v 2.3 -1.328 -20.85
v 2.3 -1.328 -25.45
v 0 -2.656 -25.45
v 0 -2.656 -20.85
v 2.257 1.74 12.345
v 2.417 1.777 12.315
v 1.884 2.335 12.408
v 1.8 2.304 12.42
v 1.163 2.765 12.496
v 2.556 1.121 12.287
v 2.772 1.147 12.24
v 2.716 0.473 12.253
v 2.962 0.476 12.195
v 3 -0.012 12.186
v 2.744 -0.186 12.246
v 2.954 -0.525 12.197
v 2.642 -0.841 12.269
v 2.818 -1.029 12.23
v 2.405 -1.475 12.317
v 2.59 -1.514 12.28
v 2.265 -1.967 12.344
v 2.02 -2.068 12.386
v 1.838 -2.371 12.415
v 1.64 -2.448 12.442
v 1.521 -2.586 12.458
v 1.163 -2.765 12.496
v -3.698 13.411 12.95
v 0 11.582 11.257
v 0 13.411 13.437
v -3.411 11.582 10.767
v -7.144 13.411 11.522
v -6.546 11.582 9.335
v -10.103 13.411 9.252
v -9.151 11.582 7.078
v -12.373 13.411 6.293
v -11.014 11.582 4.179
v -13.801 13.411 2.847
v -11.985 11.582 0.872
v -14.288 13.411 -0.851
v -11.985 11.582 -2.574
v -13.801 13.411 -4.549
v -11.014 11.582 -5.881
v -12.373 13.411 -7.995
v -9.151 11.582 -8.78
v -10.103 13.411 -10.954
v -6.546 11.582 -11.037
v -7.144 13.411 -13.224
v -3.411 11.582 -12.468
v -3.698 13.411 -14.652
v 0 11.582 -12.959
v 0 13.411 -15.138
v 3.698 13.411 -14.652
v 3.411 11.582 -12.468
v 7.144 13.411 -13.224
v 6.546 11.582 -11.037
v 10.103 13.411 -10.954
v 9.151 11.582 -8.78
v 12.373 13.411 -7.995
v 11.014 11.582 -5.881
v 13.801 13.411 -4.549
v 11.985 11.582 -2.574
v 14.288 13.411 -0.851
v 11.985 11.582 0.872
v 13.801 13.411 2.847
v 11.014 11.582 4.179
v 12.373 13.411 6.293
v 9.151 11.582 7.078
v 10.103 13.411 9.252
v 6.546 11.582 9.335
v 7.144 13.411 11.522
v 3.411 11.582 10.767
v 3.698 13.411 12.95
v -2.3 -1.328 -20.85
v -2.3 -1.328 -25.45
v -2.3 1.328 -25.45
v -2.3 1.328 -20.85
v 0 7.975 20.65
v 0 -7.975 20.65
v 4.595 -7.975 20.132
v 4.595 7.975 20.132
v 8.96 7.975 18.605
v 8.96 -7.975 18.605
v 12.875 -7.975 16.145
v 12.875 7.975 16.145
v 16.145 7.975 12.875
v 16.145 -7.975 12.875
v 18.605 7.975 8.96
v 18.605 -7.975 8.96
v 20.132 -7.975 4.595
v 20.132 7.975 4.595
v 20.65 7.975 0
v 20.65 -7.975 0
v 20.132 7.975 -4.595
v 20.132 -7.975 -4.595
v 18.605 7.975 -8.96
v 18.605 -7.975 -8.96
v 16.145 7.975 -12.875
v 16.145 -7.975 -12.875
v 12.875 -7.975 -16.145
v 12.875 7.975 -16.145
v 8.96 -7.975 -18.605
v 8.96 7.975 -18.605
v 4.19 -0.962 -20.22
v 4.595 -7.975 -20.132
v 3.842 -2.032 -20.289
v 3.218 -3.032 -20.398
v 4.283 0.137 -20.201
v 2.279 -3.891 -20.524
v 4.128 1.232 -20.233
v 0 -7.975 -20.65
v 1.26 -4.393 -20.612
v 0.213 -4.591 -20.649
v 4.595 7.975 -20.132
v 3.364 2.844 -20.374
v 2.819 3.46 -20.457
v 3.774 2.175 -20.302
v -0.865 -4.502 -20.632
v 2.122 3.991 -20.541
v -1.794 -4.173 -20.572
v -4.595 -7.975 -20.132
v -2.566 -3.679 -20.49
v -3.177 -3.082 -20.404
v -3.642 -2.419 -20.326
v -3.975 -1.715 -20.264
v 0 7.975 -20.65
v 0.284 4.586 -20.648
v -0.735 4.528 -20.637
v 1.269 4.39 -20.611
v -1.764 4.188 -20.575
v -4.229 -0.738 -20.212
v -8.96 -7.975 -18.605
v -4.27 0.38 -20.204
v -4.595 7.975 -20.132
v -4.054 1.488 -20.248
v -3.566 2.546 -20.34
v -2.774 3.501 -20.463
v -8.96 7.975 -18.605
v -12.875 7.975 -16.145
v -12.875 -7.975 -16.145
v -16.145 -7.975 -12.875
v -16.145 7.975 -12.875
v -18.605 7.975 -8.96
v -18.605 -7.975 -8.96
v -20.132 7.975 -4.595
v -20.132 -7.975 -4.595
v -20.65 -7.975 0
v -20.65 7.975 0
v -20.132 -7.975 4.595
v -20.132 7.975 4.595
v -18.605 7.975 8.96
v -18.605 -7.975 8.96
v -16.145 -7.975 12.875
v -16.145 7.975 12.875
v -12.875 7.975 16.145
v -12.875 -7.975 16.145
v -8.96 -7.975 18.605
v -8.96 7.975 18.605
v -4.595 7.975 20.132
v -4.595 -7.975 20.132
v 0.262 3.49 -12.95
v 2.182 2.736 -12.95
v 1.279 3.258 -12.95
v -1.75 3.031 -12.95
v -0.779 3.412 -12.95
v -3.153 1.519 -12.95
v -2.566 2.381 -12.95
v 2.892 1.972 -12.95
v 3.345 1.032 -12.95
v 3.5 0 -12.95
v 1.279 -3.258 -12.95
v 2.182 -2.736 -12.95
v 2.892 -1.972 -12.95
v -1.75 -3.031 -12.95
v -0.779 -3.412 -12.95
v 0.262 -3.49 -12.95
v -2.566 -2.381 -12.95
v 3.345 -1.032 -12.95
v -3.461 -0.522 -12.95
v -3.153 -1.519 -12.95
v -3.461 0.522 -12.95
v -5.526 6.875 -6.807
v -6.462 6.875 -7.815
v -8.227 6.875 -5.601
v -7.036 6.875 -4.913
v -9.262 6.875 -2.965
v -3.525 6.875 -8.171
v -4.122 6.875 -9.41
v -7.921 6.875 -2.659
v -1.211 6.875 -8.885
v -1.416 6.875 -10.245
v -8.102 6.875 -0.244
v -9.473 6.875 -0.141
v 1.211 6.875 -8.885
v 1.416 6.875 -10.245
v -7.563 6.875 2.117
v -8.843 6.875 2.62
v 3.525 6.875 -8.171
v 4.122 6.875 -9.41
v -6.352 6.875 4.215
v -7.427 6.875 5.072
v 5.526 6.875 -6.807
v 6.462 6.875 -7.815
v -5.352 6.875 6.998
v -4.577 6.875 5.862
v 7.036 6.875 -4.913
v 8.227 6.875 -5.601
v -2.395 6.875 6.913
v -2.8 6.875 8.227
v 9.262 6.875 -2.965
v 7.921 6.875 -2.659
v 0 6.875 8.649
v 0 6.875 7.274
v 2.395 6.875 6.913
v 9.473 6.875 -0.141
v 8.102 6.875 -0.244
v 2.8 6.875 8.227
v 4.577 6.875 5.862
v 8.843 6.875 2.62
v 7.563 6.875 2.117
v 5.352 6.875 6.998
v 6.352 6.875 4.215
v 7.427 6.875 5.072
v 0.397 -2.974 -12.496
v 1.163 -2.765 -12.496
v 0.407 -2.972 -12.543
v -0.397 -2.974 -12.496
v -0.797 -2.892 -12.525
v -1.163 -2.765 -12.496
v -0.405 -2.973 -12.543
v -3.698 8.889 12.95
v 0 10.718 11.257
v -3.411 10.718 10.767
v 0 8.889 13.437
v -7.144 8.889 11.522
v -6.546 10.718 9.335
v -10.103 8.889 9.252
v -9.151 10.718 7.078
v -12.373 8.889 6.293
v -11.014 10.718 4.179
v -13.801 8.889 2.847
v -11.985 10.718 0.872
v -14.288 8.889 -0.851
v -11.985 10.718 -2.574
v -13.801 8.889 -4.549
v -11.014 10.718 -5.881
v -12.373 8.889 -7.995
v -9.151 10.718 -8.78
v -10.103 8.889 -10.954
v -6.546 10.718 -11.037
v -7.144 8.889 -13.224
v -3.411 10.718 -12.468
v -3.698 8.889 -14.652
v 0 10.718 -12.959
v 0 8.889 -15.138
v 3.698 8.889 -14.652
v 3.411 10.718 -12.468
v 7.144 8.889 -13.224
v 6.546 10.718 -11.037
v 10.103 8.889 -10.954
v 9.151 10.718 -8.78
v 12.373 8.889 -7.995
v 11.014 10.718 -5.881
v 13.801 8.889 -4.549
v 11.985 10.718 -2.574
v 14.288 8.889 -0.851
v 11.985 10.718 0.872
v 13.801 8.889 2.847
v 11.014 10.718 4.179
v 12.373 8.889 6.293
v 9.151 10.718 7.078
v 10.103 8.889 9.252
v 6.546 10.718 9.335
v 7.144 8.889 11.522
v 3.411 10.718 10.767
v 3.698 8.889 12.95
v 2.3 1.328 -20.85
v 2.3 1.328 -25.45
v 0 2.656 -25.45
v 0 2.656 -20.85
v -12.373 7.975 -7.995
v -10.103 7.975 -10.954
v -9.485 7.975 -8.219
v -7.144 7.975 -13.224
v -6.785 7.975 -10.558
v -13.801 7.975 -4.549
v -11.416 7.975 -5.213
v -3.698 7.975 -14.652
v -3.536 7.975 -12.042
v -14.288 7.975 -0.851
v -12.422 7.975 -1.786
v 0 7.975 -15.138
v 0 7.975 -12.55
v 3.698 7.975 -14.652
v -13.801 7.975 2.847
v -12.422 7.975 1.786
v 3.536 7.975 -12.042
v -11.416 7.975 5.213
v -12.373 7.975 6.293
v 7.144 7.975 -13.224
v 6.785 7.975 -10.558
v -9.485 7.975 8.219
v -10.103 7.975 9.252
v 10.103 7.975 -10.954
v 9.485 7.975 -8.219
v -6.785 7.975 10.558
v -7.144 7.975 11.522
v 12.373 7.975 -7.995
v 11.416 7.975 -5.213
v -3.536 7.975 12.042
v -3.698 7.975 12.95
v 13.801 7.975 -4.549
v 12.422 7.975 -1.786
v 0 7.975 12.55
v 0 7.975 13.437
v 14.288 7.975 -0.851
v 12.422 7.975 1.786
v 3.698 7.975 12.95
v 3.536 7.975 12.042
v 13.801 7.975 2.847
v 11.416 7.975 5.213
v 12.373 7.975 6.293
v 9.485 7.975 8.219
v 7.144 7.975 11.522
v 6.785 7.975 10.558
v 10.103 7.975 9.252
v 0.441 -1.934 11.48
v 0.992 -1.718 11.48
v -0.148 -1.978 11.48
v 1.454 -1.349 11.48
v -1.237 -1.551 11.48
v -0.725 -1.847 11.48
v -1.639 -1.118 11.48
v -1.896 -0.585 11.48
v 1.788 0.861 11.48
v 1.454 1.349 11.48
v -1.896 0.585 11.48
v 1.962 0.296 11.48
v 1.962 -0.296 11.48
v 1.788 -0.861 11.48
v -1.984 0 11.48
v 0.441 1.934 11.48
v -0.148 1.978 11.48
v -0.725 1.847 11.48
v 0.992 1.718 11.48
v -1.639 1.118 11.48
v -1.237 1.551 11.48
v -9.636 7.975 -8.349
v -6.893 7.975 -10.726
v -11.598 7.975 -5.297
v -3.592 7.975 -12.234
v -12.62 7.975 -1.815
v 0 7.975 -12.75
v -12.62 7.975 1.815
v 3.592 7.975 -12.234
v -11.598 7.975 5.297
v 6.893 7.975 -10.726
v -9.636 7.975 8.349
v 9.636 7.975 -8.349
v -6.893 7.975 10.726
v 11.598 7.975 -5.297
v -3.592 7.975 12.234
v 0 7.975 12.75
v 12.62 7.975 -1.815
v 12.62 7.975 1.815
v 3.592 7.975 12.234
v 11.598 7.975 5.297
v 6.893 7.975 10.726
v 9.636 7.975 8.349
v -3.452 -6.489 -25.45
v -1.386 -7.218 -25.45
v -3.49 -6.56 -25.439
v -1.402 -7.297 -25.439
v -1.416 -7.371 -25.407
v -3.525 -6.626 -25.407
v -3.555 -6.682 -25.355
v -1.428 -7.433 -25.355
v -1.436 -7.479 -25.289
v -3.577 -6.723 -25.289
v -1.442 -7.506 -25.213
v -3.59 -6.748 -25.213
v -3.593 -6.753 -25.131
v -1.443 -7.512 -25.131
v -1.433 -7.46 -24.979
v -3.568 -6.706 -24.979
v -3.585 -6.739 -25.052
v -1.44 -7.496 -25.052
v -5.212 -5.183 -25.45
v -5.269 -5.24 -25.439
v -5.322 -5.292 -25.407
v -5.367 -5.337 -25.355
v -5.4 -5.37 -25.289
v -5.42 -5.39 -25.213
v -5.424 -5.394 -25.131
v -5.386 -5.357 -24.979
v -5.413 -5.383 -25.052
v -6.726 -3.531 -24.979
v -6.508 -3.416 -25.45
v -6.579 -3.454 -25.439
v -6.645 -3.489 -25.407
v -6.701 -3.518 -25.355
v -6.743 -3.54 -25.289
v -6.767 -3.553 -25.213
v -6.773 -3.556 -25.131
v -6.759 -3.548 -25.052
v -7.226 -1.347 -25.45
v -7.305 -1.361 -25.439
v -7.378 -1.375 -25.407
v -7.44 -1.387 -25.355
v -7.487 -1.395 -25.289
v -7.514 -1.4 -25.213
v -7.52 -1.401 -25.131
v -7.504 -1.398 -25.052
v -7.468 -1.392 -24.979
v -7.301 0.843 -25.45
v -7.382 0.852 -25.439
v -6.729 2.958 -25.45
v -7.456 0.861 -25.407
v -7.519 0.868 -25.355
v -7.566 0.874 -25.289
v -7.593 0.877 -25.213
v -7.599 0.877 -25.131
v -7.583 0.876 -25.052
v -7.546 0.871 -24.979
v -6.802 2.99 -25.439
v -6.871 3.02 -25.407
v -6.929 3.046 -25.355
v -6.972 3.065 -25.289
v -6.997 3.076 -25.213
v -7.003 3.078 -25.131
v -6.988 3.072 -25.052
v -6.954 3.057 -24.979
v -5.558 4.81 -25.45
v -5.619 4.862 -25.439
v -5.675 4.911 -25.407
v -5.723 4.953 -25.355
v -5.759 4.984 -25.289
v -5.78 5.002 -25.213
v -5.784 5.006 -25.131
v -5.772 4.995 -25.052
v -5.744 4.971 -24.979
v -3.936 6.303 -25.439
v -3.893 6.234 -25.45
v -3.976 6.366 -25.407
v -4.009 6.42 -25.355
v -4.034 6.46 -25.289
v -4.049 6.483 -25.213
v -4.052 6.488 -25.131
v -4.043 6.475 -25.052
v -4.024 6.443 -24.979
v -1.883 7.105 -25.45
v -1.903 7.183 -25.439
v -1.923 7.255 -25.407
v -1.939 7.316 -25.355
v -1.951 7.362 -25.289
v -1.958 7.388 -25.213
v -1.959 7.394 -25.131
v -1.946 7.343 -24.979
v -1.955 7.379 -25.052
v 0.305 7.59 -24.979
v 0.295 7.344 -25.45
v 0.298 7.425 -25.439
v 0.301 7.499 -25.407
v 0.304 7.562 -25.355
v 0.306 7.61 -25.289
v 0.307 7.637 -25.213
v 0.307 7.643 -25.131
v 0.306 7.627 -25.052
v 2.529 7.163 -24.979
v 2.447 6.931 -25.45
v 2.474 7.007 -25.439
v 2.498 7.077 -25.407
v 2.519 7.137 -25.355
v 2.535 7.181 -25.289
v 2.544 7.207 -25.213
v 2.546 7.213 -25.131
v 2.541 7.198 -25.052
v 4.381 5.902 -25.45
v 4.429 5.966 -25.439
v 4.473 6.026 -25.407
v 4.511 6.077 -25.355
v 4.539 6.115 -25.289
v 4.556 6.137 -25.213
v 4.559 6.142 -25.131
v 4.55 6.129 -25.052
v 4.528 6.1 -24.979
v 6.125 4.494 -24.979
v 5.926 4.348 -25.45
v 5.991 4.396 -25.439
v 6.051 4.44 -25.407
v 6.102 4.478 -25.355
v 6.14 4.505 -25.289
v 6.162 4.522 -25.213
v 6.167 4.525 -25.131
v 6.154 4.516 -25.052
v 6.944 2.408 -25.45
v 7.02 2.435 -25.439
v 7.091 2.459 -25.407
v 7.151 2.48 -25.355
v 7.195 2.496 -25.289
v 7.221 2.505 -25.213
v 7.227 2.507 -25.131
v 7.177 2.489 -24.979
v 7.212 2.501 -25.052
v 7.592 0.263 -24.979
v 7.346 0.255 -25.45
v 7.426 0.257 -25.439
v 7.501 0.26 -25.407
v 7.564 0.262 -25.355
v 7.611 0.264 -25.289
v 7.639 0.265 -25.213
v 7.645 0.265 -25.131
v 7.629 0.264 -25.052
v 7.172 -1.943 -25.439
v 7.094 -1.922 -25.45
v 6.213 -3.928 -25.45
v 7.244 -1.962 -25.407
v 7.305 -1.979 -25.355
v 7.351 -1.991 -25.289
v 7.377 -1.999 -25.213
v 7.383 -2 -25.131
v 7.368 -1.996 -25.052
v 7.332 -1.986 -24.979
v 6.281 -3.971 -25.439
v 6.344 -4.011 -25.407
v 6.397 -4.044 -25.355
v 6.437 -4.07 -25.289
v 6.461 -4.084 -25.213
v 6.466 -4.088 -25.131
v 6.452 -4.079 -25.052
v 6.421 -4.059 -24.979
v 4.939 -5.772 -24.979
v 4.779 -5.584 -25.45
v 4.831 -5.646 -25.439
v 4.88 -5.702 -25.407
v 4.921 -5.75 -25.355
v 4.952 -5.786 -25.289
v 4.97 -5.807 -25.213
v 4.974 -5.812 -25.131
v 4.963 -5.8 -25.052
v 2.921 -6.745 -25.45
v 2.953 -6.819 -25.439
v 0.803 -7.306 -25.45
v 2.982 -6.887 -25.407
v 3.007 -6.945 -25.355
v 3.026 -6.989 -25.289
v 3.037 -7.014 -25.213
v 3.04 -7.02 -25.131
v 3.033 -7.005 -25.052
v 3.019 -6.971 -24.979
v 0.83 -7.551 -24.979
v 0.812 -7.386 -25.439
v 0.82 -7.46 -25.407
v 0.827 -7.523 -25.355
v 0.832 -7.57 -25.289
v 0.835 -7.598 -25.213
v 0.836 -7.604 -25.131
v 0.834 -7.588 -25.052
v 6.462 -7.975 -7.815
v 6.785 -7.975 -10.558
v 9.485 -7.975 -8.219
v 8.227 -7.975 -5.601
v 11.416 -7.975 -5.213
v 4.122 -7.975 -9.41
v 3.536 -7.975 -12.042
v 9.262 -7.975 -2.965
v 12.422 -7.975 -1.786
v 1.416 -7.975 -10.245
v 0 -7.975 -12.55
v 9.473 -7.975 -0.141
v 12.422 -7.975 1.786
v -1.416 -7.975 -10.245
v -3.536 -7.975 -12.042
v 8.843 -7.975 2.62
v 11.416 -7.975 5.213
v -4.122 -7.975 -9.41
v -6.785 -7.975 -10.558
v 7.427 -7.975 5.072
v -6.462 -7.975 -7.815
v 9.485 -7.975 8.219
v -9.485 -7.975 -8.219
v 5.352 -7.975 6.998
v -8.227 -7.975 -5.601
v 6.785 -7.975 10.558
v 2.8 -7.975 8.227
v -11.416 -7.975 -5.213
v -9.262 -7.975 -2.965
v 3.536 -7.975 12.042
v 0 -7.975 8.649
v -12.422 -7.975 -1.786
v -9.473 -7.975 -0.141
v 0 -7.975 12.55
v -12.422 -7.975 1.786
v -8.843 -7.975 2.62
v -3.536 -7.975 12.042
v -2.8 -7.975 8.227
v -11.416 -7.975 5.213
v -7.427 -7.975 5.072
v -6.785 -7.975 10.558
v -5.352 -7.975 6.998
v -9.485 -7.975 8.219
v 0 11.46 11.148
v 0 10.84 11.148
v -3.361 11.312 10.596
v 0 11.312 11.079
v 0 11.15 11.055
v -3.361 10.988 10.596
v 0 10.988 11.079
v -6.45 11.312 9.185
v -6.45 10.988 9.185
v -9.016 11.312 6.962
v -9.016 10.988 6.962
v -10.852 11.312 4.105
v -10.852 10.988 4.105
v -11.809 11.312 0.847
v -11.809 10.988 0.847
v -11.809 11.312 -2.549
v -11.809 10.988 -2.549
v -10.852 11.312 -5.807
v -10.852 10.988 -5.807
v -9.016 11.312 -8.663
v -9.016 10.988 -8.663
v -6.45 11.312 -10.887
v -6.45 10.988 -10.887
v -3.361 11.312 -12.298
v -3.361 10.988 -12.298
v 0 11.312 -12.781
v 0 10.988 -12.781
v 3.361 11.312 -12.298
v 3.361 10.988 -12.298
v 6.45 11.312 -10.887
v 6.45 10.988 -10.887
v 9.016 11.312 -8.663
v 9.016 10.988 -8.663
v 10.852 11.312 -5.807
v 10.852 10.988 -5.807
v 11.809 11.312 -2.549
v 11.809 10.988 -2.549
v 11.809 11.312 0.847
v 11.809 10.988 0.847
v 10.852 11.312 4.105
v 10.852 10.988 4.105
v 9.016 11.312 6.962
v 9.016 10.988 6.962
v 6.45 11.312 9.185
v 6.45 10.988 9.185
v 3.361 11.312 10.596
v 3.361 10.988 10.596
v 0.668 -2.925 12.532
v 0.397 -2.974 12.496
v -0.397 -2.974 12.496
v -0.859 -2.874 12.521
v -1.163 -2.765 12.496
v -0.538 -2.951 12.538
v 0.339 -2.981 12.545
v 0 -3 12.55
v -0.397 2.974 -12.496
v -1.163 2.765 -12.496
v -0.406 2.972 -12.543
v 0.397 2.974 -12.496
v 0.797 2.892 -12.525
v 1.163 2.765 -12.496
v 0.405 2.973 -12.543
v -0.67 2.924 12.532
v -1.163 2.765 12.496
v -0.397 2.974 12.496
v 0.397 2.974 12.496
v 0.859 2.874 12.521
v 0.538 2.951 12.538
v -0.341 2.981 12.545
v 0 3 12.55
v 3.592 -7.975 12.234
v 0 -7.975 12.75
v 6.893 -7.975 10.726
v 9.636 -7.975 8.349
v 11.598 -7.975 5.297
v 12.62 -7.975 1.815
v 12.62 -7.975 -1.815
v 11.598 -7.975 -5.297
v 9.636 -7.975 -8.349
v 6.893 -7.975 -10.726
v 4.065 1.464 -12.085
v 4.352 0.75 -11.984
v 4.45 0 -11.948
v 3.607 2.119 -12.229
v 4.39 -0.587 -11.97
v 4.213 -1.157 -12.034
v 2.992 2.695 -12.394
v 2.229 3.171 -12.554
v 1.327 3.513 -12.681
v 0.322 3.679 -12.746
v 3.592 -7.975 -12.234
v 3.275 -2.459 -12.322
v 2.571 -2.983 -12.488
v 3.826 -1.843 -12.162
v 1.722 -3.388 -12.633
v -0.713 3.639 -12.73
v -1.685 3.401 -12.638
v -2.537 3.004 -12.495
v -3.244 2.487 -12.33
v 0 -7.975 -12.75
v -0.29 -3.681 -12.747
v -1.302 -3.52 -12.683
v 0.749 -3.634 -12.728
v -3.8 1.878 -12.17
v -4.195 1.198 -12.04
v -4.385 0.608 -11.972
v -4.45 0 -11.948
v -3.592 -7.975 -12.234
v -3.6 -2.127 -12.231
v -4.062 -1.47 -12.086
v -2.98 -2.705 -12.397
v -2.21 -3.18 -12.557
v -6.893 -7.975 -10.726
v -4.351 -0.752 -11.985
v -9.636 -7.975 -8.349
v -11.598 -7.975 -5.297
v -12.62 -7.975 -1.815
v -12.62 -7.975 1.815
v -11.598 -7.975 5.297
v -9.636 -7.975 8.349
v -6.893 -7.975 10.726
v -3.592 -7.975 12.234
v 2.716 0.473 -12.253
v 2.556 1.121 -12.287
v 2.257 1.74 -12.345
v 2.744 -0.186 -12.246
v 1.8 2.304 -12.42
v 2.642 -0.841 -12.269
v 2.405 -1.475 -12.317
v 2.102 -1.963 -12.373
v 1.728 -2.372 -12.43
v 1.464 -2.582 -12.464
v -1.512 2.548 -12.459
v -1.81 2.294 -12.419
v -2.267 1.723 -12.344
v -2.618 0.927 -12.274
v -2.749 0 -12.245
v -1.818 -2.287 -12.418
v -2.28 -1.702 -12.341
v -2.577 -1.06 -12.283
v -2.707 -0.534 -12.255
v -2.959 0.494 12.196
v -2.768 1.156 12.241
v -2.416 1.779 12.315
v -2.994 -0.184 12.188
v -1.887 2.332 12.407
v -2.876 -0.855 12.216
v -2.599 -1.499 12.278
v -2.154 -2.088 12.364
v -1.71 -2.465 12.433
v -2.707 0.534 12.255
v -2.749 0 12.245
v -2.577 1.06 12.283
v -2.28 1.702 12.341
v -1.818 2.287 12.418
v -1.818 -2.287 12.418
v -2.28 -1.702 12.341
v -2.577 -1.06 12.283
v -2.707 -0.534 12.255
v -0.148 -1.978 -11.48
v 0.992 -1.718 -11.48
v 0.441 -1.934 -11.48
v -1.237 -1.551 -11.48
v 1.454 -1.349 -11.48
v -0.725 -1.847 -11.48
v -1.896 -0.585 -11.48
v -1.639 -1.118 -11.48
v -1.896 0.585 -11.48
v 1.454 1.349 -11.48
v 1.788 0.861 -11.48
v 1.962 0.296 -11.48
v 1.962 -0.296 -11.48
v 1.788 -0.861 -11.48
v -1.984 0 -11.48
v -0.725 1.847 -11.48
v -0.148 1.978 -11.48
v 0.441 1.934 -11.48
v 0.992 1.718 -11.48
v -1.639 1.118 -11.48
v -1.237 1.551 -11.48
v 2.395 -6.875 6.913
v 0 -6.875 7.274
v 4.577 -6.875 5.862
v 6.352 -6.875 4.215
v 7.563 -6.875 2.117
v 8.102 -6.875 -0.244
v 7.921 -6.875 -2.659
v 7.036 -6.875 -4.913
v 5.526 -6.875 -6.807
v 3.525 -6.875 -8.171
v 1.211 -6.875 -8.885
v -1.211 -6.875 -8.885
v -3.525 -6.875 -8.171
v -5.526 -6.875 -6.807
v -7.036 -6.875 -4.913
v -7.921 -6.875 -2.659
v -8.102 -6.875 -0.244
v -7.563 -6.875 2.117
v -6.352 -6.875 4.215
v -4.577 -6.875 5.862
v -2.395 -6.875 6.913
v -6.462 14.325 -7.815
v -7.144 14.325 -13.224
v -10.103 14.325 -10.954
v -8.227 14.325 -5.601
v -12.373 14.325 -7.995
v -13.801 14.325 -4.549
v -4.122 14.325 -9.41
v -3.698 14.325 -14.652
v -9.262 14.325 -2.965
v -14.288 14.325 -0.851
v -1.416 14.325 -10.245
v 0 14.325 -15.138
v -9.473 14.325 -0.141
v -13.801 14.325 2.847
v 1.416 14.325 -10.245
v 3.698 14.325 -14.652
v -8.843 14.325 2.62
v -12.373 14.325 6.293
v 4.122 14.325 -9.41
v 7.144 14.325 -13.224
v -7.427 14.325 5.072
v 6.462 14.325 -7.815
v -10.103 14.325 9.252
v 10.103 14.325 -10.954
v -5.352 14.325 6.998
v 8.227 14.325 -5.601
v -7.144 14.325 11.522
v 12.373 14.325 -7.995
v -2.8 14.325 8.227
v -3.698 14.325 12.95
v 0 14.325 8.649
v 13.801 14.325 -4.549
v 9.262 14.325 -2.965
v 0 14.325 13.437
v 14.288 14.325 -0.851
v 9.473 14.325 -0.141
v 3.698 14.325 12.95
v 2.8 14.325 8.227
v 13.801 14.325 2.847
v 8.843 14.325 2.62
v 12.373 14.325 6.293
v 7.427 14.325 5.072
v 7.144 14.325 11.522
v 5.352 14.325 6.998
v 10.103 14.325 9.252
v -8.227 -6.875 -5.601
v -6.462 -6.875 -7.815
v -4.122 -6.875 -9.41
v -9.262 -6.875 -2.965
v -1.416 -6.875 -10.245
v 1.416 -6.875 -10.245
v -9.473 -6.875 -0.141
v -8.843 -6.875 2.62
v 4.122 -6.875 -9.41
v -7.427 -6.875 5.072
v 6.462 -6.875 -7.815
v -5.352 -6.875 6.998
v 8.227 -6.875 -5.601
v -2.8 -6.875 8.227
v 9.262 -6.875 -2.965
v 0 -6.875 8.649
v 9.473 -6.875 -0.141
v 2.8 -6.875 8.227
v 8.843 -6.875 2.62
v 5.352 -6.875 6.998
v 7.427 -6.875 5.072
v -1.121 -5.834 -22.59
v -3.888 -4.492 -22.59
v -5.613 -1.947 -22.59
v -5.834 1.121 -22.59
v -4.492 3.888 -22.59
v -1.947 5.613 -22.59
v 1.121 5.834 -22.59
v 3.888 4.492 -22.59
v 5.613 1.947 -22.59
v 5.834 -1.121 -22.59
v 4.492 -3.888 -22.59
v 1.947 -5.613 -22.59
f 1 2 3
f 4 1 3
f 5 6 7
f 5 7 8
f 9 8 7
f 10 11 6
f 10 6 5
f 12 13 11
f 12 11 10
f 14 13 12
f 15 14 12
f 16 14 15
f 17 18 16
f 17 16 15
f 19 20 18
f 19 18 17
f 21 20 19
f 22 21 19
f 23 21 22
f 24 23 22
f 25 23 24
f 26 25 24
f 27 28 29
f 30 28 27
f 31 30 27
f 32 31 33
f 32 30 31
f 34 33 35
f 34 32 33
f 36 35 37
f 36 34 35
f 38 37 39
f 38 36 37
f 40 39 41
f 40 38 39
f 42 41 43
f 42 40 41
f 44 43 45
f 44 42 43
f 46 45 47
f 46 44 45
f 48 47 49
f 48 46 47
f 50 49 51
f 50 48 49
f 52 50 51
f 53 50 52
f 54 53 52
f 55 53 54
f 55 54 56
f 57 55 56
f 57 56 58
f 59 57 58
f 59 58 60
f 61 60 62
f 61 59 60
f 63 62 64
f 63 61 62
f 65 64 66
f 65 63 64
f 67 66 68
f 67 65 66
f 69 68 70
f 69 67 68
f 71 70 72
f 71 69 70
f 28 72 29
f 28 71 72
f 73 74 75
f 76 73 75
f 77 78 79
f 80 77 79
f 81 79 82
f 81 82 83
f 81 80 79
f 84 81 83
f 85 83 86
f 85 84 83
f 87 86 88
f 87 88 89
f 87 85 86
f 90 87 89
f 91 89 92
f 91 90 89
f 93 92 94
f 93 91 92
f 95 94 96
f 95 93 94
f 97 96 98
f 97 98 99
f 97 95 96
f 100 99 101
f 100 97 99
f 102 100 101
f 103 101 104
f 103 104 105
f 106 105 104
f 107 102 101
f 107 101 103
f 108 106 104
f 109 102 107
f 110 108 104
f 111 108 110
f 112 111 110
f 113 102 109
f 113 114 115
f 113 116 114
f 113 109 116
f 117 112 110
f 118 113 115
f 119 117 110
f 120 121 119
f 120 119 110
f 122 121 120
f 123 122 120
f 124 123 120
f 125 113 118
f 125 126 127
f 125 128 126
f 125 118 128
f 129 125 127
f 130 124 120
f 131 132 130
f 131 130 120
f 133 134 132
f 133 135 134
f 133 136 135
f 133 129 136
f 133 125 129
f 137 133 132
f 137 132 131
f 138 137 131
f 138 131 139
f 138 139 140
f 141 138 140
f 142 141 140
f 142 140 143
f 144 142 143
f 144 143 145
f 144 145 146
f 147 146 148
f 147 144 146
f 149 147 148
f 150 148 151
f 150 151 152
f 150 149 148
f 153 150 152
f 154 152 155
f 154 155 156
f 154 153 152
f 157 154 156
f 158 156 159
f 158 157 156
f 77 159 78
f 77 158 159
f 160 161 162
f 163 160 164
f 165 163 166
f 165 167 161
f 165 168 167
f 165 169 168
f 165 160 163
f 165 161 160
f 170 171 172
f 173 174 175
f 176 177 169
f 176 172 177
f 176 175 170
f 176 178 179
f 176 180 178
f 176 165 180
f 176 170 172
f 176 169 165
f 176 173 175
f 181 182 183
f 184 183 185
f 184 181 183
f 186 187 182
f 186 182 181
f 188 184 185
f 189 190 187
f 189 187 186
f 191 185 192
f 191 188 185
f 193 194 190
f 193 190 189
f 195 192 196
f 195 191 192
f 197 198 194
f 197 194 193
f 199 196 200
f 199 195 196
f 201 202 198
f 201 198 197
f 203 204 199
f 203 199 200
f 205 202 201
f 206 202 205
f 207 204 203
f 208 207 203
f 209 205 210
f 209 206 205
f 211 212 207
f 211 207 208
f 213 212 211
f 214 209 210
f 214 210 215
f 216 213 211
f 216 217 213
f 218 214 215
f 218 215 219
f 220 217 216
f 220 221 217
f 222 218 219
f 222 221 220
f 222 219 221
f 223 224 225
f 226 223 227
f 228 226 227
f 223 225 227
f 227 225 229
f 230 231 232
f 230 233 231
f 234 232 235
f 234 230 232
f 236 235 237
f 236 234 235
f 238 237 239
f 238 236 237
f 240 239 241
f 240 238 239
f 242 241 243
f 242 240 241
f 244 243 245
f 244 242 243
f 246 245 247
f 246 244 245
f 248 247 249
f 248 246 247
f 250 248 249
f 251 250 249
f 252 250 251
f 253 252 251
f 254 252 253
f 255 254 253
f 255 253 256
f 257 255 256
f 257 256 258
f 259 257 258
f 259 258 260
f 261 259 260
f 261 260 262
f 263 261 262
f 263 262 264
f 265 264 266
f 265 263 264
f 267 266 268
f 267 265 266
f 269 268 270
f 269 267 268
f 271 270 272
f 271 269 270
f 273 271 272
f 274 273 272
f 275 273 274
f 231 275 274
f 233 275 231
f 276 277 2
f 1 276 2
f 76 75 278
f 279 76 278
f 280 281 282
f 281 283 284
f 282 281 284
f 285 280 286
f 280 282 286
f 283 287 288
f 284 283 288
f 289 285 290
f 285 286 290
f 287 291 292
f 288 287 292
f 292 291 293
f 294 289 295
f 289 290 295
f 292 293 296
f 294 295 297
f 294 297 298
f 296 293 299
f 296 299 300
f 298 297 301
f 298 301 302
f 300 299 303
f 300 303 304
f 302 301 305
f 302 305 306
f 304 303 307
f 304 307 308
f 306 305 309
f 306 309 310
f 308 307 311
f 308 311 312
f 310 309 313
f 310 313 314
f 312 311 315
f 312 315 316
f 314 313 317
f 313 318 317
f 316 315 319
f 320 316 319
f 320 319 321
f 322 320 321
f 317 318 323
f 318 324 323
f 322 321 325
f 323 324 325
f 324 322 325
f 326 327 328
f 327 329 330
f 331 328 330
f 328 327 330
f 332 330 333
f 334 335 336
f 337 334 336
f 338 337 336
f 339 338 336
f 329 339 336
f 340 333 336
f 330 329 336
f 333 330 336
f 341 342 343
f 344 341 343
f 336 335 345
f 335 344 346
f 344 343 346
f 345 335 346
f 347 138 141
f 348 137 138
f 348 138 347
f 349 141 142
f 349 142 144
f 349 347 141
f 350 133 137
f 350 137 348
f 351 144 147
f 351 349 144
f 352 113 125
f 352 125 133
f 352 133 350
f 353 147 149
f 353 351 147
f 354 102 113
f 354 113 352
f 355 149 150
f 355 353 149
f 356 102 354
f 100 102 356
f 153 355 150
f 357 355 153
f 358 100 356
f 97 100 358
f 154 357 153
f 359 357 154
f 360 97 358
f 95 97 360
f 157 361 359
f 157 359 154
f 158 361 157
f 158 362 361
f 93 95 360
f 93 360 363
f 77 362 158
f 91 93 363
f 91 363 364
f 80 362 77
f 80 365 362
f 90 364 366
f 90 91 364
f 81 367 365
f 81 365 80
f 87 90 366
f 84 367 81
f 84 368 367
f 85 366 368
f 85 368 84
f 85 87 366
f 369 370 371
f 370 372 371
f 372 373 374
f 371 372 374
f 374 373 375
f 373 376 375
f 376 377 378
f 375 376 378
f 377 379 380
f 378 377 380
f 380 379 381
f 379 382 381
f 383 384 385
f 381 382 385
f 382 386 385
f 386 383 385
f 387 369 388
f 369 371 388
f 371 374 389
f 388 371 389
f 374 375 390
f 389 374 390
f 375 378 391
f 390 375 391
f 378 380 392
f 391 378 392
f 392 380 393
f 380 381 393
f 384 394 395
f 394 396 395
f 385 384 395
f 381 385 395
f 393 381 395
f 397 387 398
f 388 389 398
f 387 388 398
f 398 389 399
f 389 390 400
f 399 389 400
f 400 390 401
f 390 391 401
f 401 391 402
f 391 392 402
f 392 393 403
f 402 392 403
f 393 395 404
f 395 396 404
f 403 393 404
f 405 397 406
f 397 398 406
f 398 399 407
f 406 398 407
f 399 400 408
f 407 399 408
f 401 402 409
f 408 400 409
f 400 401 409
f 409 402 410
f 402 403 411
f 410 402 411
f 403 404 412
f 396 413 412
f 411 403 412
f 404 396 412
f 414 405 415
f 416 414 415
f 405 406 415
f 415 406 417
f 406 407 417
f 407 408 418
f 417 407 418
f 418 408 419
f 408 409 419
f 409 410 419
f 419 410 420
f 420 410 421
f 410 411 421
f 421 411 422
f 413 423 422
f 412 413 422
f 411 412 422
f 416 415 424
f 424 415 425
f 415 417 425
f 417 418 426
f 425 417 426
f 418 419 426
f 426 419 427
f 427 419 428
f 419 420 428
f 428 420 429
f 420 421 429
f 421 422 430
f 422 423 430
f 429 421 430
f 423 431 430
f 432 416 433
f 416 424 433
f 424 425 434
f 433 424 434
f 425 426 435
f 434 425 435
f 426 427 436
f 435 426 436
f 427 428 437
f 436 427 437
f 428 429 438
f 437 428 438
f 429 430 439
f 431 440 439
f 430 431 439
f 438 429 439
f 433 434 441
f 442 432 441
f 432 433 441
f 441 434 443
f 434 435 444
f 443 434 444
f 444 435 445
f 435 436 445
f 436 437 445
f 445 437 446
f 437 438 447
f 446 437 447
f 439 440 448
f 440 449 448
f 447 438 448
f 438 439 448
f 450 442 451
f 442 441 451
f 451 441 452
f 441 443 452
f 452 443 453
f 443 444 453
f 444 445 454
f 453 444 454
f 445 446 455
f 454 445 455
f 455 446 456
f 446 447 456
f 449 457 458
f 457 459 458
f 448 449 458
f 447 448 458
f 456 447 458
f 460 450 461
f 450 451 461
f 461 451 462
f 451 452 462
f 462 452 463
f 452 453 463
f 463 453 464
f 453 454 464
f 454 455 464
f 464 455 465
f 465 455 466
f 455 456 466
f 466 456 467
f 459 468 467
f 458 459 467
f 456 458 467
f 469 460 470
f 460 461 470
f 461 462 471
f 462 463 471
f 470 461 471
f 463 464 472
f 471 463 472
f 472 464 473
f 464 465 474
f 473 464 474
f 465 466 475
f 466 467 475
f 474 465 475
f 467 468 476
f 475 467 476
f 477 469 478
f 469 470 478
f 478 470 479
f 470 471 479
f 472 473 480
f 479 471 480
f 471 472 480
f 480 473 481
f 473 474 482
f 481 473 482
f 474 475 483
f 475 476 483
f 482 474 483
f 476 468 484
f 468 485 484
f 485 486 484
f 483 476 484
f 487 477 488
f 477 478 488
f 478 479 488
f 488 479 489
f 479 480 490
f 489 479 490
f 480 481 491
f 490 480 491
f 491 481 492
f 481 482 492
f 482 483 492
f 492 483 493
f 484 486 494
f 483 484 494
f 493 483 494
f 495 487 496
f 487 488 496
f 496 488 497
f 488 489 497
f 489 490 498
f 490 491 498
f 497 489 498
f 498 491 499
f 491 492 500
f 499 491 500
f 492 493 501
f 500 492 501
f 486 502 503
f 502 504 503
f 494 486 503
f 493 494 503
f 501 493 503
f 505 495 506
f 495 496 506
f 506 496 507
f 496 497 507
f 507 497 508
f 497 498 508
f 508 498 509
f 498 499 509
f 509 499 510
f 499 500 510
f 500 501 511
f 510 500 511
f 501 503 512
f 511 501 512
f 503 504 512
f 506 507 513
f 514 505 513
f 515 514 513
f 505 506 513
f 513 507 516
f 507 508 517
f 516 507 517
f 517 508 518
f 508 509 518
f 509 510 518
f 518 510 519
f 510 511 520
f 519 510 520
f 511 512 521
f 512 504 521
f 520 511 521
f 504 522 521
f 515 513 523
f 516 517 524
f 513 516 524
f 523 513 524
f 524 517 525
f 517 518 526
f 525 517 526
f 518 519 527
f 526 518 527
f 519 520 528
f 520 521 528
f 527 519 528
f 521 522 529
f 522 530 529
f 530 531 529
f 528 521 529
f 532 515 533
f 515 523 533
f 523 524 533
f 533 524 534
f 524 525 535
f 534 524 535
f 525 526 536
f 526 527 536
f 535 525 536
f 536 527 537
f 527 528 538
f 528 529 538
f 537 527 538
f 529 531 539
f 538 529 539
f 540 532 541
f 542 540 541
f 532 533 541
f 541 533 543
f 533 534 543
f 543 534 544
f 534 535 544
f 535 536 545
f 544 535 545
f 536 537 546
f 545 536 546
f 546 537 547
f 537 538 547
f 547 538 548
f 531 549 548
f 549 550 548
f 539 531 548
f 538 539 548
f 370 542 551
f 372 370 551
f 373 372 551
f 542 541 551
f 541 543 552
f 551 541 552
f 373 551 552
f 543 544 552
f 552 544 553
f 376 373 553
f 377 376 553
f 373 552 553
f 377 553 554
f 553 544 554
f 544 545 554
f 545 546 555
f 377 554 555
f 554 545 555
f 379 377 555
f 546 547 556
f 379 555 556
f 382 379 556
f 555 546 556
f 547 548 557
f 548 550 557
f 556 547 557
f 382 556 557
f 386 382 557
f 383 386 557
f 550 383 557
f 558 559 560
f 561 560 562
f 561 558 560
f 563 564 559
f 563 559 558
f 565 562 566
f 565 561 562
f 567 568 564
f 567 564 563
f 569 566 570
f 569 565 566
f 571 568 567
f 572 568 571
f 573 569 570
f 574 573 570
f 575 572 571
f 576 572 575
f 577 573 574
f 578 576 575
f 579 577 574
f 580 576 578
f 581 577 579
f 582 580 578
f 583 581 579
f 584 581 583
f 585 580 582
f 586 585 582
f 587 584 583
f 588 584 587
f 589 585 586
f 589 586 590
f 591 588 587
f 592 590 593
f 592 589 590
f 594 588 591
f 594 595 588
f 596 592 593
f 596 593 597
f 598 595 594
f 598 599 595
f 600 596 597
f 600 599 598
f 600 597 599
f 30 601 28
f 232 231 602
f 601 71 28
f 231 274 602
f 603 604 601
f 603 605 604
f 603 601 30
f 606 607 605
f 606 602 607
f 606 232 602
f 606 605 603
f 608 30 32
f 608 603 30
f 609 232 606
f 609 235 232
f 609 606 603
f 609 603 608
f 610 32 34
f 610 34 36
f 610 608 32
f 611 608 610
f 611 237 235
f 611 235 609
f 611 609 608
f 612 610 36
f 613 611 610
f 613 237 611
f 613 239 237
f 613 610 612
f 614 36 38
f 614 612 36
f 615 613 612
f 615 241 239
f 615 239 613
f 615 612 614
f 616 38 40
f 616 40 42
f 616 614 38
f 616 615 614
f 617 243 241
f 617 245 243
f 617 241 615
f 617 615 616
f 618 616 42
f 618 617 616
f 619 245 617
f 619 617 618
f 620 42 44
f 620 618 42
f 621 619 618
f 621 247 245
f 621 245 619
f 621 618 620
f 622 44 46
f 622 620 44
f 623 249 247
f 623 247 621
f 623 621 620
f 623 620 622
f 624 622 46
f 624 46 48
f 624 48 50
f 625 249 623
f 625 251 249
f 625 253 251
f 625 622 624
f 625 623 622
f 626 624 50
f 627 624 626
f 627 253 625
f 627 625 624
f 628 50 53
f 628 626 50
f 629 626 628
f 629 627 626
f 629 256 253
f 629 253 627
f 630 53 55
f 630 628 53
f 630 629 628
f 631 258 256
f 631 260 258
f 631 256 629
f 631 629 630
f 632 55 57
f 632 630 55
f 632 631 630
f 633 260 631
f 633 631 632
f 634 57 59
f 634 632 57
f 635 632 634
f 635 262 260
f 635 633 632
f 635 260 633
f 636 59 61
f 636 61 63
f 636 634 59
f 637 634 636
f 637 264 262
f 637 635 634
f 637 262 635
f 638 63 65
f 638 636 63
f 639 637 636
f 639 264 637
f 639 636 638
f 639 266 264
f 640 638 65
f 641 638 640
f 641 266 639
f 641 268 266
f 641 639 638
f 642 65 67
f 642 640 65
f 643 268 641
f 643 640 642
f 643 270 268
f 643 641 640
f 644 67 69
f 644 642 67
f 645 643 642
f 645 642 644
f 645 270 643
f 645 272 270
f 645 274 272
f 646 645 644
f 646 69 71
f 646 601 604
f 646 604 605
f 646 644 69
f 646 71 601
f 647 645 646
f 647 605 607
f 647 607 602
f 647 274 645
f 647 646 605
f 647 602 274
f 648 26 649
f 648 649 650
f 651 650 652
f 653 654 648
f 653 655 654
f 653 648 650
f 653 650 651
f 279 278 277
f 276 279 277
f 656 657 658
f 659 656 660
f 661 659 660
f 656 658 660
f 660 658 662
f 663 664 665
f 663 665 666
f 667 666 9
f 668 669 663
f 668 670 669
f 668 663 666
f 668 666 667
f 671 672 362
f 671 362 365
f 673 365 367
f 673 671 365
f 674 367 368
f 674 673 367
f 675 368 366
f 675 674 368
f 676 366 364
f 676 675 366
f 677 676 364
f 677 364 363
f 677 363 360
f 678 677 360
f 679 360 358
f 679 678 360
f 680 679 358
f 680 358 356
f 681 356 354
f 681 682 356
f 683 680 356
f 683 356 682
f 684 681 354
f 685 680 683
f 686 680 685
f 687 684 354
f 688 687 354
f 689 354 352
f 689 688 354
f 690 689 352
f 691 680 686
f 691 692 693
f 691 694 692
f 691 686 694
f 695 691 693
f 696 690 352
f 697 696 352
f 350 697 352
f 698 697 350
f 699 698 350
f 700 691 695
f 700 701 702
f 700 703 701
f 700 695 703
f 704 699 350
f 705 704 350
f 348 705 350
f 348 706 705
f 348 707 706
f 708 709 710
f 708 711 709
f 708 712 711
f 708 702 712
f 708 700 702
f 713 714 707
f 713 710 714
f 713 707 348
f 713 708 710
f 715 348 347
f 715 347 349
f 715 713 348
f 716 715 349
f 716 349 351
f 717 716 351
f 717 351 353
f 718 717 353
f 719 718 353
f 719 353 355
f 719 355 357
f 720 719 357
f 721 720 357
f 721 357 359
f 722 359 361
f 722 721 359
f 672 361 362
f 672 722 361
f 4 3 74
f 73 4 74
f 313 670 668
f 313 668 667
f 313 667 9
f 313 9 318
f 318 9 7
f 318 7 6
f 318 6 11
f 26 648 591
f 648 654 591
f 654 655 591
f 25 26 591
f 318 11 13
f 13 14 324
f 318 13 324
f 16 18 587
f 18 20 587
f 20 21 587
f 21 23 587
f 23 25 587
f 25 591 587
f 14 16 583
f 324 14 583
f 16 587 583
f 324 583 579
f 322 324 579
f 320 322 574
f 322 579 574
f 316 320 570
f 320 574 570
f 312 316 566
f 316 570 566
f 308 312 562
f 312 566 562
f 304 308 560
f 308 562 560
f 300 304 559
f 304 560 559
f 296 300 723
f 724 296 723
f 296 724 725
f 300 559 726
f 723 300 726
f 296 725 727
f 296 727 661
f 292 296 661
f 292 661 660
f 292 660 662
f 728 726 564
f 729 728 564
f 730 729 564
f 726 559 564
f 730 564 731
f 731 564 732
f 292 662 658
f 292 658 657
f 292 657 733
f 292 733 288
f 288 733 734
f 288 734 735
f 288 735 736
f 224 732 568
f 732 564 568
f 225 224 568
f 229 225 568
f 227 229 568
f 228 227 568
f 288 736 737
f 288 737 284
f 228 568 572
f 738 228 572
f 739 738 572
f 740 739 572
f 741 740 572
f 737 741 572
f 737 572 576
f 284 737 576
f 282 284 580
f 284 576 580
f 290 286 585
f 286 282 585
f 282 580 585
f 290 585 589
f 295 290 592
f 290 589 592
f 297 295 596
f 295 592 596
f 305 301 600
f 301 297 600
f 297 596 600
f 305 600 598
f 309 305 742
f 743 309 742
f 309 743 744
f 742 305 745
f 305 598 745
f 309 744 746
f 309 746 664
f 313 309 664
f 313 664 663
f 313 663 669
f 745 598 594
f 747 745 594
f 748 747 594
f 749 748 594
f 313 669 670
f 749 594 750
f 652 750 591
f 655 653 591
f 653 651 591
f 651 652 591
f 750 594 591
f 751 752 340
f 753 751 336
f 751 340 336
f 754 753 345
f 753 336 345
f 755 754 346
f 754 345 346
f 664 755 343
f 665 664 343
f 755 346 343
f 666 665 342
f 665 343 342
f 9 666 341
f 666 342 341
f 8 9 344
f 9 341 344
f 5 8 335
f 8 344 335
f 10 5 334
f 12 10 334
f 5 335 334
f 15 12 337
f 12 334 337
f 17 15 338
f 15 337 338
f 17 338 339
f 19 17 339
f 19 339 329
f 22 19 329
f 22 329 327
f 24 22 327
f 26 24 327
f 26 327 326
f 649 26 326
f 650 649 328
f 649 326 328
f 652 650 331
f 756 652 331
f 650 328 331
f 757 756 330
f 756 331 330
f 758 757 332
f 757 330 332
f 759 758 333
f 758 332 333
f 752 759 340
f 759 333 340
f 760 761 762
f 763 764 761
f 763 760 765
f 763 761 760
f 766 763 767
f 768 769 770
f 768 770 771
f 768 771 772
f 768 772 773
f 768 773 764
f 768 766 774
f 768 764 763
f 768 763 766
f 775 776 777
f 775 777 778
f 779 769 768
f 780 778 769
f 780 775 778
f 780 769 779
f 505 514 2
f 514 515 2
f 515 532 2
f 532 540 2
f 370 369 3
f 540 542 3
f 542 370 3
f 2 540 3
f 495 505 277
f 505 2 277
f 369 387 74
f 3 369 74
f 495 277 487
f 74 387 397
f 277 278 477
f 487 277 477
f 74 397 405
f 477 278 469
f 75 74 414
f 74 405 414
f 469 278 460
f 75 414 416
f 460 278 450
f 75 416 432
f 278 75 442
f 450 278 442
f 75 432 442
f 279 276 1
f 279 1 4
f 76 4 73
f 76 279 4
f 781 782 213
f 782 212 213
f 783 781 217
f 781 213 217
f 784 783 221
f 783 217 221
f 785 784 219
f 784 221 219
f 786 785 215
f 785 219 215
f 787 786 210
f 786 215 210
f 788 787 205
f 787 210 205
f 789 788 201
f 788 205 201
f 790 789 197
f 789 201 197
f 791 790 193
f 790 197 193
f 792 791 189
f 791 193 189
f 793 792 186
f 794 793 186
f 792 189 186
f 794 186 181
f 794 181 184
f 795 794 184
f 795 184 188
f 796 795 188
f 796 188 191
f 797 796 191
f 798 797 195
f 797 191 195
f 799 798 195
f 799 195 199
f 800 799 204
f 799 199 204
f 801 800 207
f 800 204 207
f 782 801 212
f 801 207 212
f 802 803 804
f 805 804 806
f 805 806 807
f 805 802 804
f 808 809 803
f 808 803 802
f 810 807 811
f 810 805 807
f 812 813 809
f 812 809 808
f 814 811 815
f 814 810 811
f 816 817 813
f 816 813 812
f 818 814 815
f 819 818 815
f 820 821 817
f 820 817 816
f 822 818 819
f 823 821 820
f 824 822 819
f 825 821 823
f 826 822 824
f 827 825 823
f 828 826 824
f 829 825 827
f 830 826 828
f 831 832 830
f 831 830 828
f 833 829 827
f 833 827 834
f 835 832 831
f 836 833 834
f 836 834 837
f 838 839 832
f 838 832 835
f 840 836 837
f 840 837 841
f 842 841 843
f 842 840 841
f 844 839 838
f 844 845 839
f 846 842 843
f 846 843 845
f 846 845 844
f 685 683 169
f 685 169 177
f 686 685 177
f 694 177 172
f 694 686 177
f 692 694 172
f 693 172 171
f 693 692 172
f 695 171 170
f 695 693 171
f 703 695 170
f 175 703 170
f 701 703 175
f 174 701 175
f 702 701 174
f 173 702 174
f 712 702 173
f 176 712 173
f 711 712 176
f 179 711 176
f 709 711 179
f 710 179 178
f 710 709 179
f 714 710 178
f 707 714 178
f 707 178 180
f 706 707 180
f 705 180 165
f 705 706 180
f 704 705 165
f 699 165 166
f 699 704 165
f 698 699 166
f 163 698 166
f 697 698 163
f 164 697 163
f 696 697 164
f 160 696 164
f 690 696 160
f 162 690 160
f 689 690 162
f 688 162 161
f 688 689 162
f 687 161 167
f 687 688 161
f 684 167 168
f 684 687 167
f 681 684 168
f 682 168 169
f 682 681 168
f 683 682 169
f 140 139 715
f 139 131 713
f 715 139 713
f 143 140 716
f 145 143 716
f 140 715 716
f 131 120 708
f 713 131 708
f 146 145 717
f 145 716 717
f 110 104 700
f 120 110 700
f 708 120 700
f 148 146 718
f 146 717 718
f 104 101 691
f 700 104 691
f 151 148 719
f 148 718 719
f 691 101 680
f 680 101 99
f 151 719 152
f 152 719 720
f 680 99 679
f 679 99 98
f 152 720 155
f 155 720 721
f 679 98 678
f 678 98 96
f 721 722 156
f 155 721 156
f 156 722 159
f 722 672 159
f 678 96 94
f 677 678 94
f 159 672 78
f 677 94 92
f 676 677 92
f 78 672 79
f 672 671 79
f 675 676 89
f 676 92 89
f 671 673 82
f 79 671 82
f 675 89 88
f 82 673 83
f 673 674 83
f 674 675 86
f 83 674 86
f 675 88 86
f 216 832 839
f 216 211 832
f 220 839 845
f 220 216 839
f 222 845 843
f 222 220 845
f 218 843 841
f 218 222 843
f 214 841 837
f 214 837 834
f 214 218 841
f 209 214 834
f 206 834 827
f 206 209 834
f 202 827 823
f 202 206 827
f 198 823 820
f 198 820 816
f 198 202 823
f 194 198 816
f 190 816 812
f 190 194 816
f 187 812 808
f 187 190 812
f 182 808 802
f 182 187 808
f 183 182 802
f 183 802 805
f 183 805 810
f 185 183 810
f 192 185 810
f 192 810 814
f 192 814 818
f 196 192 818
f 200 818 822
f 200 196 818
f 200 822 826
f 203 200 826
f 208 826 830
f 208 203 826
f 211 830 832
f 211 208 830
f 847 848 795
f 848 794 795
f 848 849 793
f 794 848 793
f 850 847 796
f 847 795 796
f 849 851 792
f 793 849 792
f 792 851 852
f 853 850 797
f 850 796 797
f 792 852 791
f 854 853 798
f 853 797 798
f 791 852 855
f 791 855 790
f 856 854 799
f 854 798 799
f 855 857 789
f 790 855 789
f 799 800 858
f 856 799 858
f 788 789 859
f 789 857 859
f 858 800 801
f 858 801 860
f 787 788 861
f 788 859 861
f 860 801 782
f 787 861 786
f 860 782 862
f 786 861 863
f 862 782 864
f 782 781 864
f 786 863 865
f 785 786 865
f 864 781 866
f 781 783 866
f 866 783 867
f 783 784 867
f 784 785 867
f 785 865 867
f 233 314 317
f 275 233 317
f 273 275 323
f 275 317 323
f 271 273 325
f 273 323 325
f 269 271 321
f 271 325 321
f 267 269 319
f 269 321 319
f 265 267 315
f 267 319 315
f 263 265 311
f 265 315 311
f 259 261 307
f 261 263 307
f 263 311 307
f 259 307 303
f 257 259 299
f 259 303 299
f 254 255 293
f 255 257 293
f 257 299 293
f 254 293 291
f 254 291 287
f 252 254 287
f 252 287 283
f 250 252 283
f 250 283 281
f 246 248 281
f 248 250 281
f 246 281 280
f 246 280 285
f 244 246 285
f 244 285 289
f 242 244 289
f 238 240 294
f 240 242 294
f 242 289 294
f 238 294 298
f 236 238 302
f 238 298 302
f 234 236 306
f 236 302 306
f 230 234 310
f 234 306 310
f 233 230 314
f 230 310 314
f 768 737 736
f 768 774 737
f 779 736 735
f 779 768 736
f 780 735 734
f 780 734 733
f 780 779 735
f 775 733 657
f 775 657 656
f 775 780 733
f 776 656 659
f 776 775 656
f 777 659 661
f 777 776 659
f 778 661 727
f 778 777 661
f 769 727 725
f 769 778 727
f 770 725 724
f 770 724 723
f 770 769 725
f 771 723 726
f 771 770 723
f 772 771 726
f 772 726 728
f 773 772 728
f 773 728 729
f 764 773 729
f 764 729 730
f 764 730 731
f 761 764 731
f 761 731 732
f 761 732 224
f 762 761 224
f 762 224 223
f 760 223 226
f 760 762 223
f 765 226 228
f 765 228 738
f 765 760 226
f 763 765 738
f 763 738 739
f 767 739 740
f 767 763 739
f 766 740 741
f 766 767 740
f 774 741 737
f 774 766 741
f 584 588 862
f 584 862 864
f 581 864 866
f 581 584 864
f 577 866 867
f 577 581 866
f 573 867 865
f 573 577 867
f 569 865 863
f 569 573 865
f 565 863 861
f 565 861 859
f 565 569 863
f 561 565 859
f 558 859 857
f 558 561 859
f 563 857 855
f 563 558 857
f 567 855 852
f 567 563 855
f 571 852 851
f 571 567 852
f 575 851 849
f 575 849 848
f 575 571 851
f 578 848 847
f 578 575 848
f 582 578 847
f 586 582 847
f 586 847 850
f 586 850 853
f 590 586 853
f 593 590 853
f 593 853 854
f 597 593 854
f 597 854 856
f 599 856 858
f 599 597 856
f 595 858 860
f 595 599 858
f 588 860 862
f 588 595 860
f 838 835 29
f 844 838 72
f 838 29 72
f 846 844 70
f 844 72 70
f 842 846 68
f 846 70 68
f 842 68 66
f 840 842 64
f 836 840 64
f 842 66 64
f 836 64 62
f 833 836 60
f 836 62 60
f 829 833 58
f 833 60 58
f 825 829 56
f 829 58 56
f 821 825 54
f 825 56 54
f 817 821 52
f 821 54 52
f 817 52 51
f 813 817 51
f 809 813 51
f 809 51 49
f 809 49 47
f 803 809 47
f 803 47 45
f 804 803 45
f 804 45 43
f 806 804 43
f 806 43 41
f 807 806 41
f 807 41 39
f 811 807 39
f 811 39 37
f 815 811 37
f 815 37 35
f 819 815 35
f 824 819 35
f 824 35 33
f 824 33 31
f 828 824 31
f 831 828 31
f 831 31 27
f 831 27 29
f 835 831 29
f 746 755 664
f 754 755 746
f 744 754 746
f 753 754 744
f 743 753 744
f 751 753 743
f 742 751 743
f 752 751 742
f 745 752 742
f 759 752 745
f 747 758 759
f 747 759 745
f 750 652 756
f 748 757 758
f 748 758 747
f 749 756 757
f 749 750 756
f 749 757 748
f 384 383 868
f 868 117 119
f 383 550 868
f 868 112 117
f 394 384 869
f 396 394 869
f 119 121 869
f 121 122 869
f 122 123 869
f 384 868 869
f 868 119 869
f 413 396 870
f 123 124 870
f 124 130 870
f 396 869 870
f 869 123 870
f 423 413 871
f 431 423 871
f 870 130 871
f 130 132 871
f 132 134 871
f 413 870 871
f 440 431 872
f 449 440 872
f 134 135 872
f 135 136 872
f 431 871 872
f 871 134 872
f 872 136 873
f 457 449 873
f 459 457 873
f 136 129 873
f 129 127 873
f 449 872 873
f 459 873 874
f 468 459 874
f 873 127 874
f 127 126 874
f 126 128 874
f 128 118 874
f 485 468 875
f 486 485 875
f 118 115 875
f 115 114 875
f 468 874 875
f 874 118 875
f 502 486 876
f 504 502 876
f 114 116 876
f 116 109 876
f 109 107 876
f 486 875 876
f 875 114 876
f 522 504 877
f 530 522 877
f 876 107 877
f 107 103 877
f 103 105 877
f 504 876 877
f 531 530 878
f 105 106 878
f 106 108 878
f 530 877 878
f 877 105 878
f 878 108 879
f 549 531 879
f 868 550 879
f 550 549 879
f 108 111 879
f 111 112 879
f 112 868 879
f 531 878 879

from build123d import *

# Parameters (mm, degrees)
SKETCH1_R                       = 20.65
SKETCH1_R_2                     = 12.75
BOSS_EXTRUDE1_DEPTH             = 7.975
CUT_EXTRUDE1_DEPTH              = 4.6
BOSS_EXTRUDE2_REACH             = 35.73
SKETCH5_R                       = 12.55
SKETCH5_R_2                     = 8.125
BOSS_EXTRUDE2_DIRECTION_2_REACH = 35.73
SKETCH6_R                       = 9.5
CUT_EXTRUDE2_DEPTH              = 1.1
SKETCH7_R                       = 14.2875
SKETCH7_R_2                     = 9.5
BOSS_EXTRUDE4_DEPTH             = 6.35
SKETCH9_R                       = 3
CUT_EXTRUDE3_DEPTH              = 13.97
CHAMFER1_SIZE                   = 1.016
CHAMFER1_OF_MIRROR2_SIZE        = 1.016


with BuildPart() as part:
    # Sketch1 → Boss-Extrude1 (new, symmetric)
    with BuildSketch(Plane(origin=(0, 0, 0), x_dir=(1, 0, 0), z_dir=(0, 1, 0))):
        with Locations(Location((0, 0, 0), (0, 0, 270))):
            Circle(SKETCH1_R)
        with Locations(Location((0, 0, 0), (0, 0, 270))):
            Circle(SKETCH1_R_2, mode=Mode.SUBTRACT)
    extrude(amount=BOSS_EXTRUDE1_DEPTH, both=True)

    # Sketch2 → Revolve1 (revolve)
    with BuildSketch(Plane(origin=(0, 0, 0), x_dir=(1, 0, 0), z_dir=(0, 1, 0)), mode=Mode.PRIVATE) as revolve1_sk:
        with BuildLine():
            Line((0, 25.45), (-7.35, 25.45))
            ThreePointArc((-7.35, 25.45), (-7.615766407, 25.289169741), (-7.596577614, 24.979121446))
            Line((-7.596577614, 24.979121446), (-4.2850054, 20.200525457))
            Line((-4.2850054, 20.200525457), (0, 20.200525457))
            Line((0, 20.200525457), (0, 25.45))
        make_face()
    revolve(revolve1_sk.sketch.rotate(Axis((0, 0, 23), (0, 0, -1)), 280.872235791), axis=Axis((0, 0, 23), (0, 0, -1)))

    # Sketch3 → Cut-Extrude1 (cut)
    with BuildSketch(Plane(origin=(0, 0, -25.45), x_dir=(-1, 0, 0), z_dir=(0, 0, -1))):
        Polygon((0, 2.655811238), (-2.3, 1.327905619), (-2.3, -1.327905619), (0, -2.655811238), (2.3, -1.327905619), (2.3, 1.327905619), align=None)
    extrude(amount=-CUT_EXTRUDE1_DEPTH, mode=Mode.SUBTRACT)

    # Sketch4 → Cut-Revolve2 (revolve, cut)
    with BuildSketch(Plane(origin=(0, 0, 0), x_dir=(1, 0, 0), z_dir=(0, 1, 0)), mode=Mode.PRIVATE) as cut_revolve2_sk:
        Polygon((0, 12.95), (-3.5, 12.95), (-4.45, 11.948221625), (0, 11.948221625), align=None)
    revolve(cut_revolve2_sk.sketch.rotate(Axis((0, 0, 23), (0, 0, -1)), 180), axis=Axis((0, 0, 23), (0, 0, -1)), mode=Mode.SUBTRACT)


with BuildPart() as body_2:

    # Boss-Extrude2: up to this face of the body (flat: up to its plane)
    boss_extrude2_end = Plane(part.part.faces().sort_by_distance((0, 7.975, -20.065929799))[0])
    # Sketch5 → Boss-Extrude2 (new, up to the picked face)
    with BuildSketch(Plane(origin=(0, 0, 0), x_dir=(1, 0, 0), z_dir=(0, 1, 0)), mode=Mode.PRIVATE) as boss_extrude2_sk1:
        with Locations(Location((0, 0, 0), (0, 0, 270))):
            Circle(SKETCH5_R)
        with Locations(Location((0, 0.8509, 0), (0, 0, 270))):
            Circle(SKETCH5_R_2, mode=Mode.SUBTRACT)
    boss_extrude2_tool1 = split(extrude(boss_extrude2_sk1.sketch, amount=BOSS_EXTRUDE2_REACH, mode=Mode.PRIVATE), bisect_by=boss_extrude2_end, keep=Keep.BOTH, mode=Mode.PRIVATE)
    add(boss_extrude2_tool1.solids().sort_by(Axis((0, 0, -12.195032), (0, 1, 0)))[0])


    # Boss-Extrude2 direction 2: up to this face of the body (flat: up to its plane)
    boss_extrude2_direction_2_end = Plane(part.part.faces().sort_by_distance((0, -7.975, -20.065929799))[0])
    # Sketch5 → Boss-Extrude2 direction 2 (add, up to the picked face)
    with BuildSketch(Plane(origin=(0, 0, 0), x_dir=(1, 0, 0), z_dir=(0, 1, 0)), mode=Mode.PRIVATE) as boss_extrude2_direction_2_sk1:
        with Locations(Location((0, 0, 0), (0, 0, 270))):
            Circle(SKETCH5_R)
        with Locations(Location((0, 0.8509, 0), (0, 0, 270))):
            Circle(SKETCH5_R_2, mode=Mode.SUBTRACT)
    boss_extrude2_direction_2_tool1 = split(extrude(boss_extrude2_direction_2_sk1.sketch, amount=-BOSS_EXTRUDE2_DIRECTION_2_REACH, mode=Mode.PRIVATE), bisect_by=boss_extrude2_direction_2_end, keep=Keep.BOTH, mode=Mode.PRIVATE)
    add(boss_extrude2_direction_2_tool1.solids().sort_by(Axis((0, 0, -12.195032), (0, -1, 0)))[0])

    # Sketch6 → Cut-Extrude2 (cut)
    with BuildSketch(Plane(origin=(0, 7.975, 0), x_dir=(1, 0, 0), z_dir=(0, 1, 0))):
        with Locations(Location((0, 0.8509, 0), (0, 0, 270))):
            Circle(SKETCH6_R)
    cut_extrude2 = extrude(amount=-CUT_EXTRUDE2_DEPTH, mode=Mode.SUBTRACT)

    # Mirror1: Cut-Extrude2 across plane
    add(cut_extrude2.mirror(Plane.ZX), mode=Mode.SUBTRACT)

    # Sketch7 → Boss-Extrude4 (add)
    with BuildSketch(Plane(origin=(0, 7.975, 0), x_dir=(1, 0, 0), z_dir=(0, 1, 0))):
        with Locations(Location((0, 0.8509, 0), (0, 0, 270))):
            Circle(SKETCH7_R)
        with Locations(Location((0, 0.8509, 0), (0, 0, 270))):
            Circle(SKETCH7_R_2, mode=Mode.SUBTRACT)
    extrude(amount=BOSS_EXTRUDE4_DEPTH)

    # Sketch8 → Cut-Revolve3 (revolve, cut)
    with BuildSketch(Plane(origin=(0, 0, 0), x_dir=(0, 0, -1), z_dir=(1, 0, 0)), mode=Mode.PRIVATE) as cut_revolve3_sk:
        with BuildLine():
            Line((15.1384, 13.411310764), (12.958776549, 11.58238953))
            ThreePointArc((12.958776549, 11.58238953), (12.75715, 11.15), (12.958776549, 10.71761047))
            Line((12.958776549, 10.71761047), (15.1384, 8.888689236))
            Line((15.1384, 8.888689236), (15.1384, 13.411310764))
        make_face()
    revolve(cut_revolve3_sk.sketch.rotate(Axis((0, 38.651123455, -0.8509), (0, -1, 0)), 180), axis=Axis((0, 38.651123455, -0.8509), (0, -1, 0)), mode=Mode.SUBTRACT)

    # Sketch9 → Cut-Extrude3 (cut)
    with BuildSketch(Plane(origin=(0, 0, -25.45), x_dir=(-1, 0, 0), z_dir=(0, 0, -1))):
        Circle(SKETCH9_R)
    cut_extrude3 = extrude(amount=-CUT_EXTRUDE3_DEPTH, mode=Mode.SUBTRACT)

    # Chamfer1
    # the kernel refuses this chamfer: 1.016 mm, written as the material it adds along each edge
    with BuildSketch(Plane(origin=(0, 0, -11.48), x_dir=(-1, 0, 0), z_dir=(0, -1, 0))) as chamfer1_piece_1_section:
        Polygon((3, CHAMFER1_SIZE), (3 - CHAMFER1_SIZE, 0), (3, 0), align=None)
    chamfer1_piece_1 = revolve(axis=Axis((0, 0, -11.48), (0, 0, -1)), mode=Mode.PRIVATE)
    chamfer1_piece_1 = chamfer1_piece_1 & Plane(origin=(0, 0, 0), x_dir=(0, 0, 1), z_dir=(0, -1, 0)) * Cylinder(12.55, 12, mode=Mode.PRIVATE)
    add(chamfer1_piece_1)

    # Mirror2: Cut-Extrude3 across plane
    add(cut_extrude3.mirror(Plane.XY), mode=Mode.SUBTRACT)

    # Chamfer1 of Mirror2
    # the kernel refuses this chamfer: 1.016 mm, written as the material it adds along each edge
    with BuildSketch(Plane(origin=(0, 0, 11.48), x_dir=(-1, 0, 0), z_dir=(0, -1, 0))) as chamfer1_of_mirror2_piece_1_section:
        Polygon((3, -CHAMFER1_OF_MIRROR2_SIZE), (3 - CHAMFER1_OF_MIRROR2_SIZE, 0), (3, 0), align=None)
    chamfer1_of_mirror2_piece_1 = revolve(axis=Axis((0, 0, 11.48), (0, 0, -1)), mode=Mode.PRIVATE)
    chamfer1_of_mirror2_piece_1 = chamfer1_of_mirror2_piece_1 & Plane(origin=(0, 0, 0), x_dir=(0, 0, 1), z_dir=(0, -1, 0)) * Cylinder(12.55, 12, mode=Mode.PRIVATE)
    add(chamfer1_of_mirror2_piece_1)


solid = Compound([part.part, body_2.part])
